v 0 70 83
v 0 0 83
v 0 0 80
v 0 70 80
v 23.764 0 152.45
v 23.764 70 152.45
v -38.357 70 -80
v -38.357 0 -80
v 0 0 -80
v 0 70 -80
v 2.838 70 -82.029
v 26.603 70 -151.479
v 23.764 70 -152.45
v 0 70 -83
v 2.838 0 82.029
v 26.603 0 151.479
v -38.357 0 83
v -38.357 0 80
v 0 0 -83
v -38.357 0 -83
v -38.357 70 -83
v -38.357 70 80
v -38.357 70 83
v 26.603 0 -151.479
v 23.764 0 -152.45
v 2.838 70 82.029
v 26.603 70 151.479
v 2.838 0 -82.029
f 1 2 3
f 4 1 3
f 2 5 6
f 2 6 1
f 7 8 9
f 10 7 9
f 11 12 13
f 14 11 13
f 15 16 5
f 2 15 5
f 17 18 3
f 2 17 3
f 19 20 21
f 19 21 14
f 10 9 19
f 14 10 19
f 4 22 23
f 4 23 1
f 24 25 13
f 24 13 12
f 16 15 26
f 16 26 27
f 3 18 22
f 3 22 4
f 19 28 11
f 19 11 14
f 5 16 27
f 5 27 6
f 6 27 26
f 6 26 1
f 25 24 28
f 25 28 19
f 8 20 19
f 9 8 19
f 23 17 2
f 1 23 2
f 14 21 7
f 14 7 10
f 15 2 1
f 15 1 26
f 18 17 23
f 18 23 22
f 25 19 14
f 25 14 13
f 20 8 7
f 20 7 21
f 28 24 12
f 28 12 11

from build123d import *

# Parameters (mm, degrees)
CROQUIS1_W                = 38.357380244
CROQUIS1_H                = 3
SALIENTE_EXTRUIR1_DEPTH   = 70
SALIENTE_EXTRUIR1_2_DEPTH = 70
SALIENTE_EXTRUIR1_3_DEPTH = 70
SALIENTE_EXTRUIR1_4_DEPTH = 70


with BuildPart() as part:
    # Croquis1 → Saliente-Extruir1 (new body)
    with BuildSketch(Plane(origin=(0, 0, 0), x_dir=(1, 0, 0), z_dir=(0, 1, 0))):
        with Locations((-19.178690122, -81.5)):
            Rectangle(CROQUIS1_W, CROQUIS1_H)
    extrude(amount=SALIENTE_EXTRUIR1_DEPTH)


with BuildPart() as body_2:
    # Croquis1 → Saliente-Extruir1 2 (new body)
    with BuildSketch(Plane(origin=(0, 0, 0), x_dir=(1, 0, 0), z_dir=(0, 1, 0))):
        Polygon((26.602686749, -151.478752289), (23.764257979, -152.45), (0, -83), (2.83842877, -82.028752289), align=None)
    extrude(amount=SALIENTE_EXTRUIR1_2_DEPTH)


with BuildPart() as body_3:
    # Croquis1 → Saliente-Extruir1 3 (new body)
    with BuildSketch(Plane(origin=(0, 0, 0), x_dir=(1, 0, 0), z_dir=(0, 1, 0))):
        with Locations((-19.178690122, 81.5)):
            Rectangle(CROQUIS1_W, CROQUIS1_H)
    extrude(amount=SALIENTE_EXTRUIR1_3_DEPTH)


with BuildPart() as body_4:
    # Croquis1 → Saliente-Extruir1 4 (new body)
    with BuildSketch(Plane(origin=(0, 0, 0), x_dir=(1, 0, 0), z_dir=(0, 1, 0))):
        Polygon((26.602686749, 151.478752289), (2.83842877, 82.028752289), (0, 83), (23.764257979, 152.45), align=None)
    extrude(amount=SALIENTE_EXTRUIR1_4_DEPTH)


solid = Compound([part.part, body_2.part, body_3.part, body_4.part])
